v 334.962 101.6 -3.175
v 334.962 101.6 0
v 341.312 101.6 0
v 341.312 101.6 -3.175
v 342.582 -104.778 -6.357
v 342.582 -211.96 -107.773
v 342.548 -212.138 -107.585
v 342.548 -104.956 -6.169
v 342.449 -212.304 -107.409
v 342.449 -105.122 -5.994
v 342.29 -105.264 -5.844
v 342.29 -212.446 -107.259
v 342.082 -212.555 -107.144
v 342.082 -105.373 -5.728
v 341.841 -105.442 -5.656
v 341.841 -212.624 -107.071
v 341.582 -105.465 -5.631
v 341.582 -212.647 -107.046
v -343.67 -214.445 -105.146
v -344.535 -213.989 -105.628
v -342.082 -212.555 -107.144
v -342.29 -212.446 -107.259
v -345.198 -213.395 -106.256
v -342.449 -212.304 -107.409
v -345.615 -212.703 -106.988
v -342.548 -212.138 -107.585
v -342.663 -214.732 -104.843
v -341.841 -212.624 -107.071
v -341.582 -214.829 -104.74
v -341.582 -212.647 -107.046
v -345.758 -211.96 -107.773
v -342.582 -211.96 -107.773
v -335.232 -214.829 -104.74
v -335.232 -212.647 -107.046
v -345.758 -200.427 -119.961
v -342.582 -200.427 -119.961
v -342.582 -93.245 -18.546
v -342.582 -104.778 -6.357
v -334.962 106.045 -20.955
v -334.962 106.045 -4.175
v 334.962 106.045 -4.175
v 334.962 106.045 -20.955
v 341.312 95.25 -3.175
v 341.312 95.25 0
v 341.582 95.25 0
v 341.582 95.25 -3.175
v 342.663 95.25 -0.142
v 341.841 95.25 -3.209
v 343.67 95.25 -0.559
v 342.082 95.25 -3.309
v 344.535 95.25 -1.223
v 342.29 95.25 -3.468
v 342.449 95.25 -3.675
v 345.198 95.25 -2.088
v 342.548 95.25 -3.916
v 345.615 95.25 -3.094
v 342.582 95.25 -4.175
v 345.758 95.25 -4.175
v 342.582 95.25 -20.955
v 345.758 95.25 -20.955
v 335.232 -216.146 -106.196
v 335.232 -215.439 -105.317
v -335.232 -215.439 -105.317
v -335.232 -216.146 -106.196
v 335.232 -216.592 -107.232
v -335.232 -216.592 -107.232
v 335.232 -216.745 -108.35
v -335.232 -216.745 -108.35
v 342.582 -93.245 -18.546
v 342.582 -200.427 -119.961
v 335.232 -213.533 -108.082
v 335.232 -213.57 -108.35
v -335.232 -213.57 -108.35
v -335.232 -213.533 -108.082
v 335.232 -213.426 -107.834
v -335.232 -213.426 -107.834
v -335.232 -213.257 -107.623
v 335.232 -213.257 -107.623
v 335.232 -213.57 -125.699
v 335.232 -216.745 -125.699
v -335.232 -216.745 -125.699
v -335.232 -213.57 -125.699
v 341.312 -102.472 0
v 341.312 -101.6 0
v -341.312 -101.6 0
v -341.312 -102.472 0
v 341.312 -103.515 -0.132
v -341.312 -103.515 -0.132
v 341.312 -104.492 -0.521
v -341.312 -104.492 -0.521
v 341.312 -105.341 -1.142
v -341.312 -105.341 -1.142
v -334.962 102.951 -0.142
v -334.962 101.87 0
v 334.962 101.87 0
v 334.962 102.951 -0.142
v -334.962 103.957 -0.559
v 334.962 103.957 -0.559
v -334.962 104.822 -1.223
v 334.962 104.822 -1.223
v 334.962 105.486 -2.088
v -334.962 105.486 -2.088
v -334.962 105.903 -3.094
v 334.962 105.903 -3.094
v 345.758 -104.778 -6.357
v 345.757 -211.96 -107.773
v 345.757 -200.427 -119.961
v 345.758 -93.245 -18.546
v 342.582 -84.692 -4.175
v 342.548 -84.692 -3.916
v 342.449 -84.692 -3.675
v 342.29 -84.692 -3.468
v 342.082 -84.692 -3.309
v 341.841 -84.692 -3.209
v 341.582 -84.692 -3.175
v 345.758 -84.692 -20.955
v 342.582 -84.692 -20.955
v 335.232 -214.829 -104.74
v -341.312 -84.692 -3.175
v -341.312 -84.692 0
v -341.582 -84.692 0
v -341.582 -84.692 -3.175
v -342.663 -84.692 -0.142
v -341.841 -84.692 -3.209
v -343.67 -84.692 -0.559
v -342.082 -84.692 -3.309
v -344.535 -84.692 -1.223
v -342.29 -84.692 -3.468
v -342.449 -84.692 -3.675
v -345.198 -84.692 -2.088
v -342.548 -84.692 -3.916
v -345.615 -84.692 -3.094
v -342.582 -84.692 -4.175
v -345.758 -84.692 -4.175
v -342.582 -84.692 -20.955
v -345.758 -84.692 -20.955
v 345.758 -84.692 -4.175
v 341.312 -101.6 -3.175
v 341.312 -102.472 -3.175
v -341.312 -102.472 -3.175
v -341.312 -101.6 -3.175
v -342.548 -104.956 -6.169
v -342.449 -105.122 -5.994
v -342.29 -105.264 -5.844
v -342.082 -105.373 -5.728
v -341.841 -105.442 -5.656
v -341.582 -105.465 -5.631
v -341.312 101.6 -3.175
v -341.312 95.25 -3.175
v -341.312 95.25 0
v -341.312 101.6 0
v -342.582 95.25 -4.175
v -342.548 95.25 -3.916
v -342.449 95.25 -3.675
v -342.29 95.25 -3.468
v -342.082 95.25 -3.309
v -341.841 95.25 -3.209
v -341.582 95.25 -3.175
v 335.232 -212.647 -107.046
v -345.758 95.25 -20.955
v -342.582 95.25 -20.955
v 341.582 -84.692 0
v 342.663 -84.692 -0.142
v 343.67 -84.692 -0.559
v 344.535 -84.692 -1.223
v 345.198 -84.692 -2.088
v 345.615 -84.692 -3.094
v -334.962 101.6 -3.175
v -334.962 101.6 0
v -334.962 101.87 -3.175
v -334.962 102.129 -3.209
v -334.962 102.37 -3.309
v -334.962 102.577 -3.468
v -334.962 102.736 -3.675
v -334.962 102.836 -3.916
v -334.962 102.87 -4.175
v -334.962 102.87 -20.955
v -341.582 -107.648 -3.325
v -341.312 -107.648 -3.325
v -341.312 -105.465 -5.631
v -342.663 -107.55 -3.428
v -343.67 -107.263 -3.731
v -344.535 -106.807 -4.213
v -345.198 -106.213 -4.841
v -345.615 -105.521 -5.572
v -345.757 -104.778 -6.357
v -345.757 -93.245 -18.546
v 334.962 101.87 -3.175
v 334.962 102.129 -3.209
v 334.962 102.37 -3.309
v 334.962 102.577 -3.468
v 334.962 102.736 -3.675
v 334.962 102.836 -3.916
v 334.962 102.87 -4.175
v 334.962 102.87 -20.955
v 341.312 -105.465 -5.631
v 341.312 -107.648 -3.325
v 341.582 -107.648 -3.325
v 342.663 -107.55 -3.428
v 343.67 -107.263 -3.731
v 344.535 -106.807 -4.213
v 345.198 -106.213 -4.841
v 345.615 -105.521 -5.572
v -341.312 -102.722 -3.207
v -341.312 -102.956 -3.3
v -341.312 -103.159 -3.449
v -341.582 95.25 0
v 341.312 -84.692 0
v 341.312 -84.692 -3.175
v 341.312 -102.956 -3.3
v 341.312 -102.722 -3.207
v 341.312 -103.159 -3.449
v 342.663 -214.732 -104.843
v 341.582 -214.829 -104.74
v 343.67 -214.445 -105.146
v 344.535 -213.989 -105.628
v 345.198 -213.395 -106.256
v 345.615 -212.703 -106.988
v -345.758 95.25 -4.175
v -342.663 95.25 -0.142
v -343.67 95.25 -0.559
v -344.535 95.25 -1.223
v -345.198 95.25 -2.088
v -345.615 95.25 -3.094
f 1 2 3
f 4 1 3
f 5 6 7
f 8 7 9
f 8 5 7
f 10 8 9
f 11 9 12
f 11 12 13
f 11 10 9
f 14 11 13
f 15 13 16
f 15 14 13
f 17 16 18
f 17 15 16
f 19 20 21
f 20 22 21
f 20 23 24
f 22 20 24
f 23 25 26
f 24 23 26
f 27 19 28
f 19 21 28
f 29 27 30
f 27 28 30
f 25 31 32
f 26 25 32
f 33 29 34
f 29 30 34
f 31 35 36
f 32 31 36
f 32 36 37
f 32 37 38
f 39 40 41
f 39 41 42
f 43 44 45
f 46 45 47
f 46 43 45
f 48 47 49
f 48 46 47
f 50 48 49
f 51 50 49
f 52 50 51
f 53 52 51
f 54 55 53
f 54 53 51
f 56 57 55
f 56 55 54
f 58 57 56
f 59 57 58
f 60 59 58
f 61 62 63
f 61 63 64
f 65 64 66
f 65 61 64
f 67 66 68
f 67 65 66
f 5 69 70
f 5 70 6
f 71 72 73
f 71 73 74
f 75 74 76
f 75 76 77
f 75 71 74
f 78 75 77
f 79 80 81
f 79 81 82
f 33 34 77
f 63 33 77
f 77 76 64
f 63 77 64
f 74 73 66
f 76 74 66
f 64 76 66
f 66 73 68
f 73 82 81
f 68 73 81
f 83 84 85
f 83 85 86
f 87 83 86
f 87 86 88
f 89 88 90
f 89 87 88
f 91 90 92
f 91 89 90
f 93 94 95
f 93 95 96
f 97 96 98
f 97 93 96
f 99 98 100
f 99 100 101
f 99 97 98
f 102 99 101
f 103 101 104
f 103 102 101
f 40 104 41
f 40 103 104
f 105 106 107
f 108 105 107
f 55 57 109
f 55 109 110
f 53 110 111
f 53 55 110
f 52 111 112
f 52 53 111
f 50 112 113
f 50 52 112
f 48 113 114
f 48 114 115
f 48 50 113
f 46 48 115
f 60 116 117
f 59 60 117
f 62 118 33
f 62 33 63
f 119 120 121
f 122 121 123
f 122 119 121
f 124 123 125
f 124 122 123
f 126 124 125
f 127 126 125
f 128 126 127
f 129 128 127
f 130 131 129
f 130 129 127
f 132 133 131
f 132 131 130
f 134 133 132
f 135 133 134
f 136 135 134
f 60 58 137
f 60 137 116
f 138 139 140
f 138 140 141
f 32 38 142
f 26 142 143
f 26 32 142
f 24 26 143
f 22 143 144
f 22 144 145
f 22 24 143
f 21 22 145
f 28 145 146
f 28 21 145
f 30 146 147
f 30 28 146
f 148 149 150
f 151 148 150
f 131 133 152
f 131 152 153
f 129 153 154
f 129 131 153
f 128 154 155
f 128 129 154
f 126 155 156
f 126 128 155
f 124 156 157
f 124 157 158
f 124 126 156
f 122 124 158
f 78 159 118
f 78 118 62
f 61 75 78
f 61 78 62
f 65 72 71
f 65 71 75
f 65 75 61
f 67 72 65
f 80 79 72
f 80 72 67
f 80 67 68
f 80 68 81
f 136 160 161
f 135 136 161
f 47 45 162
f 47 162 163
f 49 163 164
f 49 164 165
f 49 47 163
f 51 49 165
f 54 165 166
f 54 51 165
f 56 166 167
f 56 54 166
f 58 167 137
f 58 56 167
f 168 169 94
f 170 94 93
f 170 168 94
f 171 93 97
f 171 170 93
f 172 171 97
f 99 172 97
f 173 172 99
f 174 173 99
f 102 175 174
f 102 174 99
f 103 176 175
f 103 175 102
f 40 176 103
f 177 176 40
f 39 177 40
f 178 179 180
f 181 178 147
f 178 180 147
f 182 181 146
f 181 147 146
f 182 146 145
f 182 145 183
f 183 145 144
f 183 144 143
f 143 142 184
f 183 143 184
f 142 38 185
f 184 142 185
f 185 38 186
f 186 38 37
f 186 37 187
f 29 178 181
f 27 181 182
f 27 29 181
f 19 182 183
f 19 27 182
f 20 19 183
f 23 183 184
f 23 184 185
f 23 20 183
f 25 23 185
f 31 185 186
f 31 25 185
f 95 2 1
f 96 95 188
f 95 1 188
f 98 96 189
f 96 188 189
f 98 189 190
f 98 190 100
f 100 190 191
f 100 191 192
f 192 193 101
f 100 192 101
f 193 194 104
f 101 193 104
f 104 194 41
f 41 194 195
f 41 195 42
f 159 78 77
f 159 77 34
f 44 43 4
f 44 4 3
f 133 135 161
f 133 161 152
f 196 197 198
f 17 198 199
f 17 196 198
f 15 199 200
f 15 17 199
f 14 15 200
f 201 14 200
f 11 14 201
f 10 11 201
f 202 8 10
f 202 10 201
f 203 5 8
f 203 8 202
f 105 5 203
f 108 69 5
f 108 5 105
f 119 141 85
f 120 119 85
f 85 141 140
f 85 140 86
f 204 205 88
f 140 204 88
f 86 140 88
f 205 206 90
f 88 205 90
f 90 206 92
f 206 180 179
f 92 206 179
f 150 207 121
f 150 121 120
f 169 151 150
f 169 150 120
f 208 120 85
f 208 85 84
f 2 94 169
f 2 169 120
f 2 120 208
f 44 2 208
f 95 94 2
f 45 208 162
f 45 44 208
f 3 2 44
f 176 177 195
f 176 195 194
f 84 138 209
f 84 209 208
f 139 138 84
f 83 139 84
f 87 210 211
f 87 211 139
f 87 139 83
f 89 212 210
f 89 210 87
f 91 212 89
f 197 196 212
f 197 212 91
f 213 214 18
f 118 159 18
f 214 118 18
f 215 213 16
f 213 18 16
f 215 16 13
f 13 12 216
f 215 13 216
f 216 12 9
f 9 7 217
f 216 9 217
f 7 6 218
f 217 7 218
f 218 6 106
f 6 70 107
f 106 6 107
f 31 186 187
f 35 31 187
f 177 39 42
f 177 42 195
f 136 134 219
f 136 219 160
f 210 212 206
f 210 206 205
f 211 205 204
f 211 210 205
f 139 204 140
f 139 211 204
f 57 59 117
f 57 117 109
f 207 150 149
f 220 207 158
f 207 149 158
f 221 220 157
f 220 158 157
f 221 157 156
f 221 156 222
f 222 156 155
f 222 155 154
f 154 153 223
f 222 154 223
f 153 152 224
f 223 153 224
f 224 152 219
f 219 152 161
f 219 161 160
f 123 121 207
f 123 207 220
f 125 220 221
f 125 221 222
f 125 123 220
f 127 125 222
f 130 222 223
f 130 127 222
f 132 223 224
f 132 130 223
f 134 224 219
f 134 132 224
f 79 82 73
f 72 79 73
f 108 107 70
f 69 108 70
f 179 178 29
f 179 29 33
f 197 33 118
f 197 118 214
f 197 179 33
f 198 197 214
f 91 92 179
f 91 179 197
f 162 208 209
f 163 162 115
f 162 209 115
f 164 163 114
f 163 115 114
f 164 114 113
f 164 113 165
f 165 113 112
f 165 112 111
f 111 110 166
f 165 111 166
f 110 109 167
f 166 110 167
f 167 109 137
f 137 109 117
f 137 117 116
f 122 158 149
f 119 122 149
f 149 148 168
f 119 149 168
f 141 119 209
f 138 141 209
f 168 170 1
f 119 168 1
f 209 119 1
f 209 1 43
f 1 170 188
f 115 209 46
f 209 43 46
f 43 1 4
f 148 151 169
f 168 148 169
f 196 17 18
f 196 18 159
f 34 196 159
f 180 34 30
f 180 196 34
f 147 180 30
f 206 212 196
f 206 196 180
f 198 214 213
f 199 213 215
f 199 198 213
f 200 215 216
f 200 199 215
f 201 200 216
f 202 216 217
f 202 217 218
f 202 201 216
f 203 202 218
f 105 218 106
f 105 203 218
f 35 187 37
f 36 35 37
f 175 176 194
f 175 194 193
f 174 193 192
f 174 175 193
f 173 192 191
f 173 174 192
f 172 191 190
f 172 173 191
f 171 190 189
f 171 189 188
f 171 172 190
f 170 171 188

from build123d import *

# Parameters (mm, degrees)
SKETCH1_W                 = 682.625
SKETCH1_H                 = 203.2
BASE_FLANGE1_DEPTH        = 3.175
EDGE_FLANGE1_DEPTH        = 682.625
EDGE_FLANGE3_DEPTH        = 669.925
EDGE_FLANGE3_BEND_DEPTH   = 179.941884035
EDGE_FLANGE3_BEND_2_DEPTH = 179.941884035
EDGE_FLANGE3_BEND_3_DEPTH = 147.556884035
EDGE_FLANGE3_BEND_4_DEPTH = 147.556884035
EDGE_FLANGE4_DEPTH        = 670.465


# Sheet-metal steps are written as plain solids
with BuildPart() as part:
    # Sketch1 → Base-Flange1 (new body)
    with BuildSketch(Plane.XY):
        Rectangle(SKETCH1_W, SKETCH1_H)
    extrude(amount=-BASE_FLANGE1_DEPTH)

    # Edge-Flange1 section (across the edge) → Edge-Flange1 (add)
    with BuildSketch(Plane(origin=(341.3125, -102.87, -3.175), x_dir=(0, 0.6872977622647618, -0.7263757884083493), z_dir=(-1, 0, 0))):
        with BuildLine():
            Line((-3.175, 0.398115965), (-3.175, 151.13))
            Line((-3.175, 151.13), (0, 151.13))
            Line((0, 151.13), (0, 0.398115965))
            ThreePointArc((0, 0.398115965), (0.070920943, 0.02823476), (0.273624212, -0.289181798))
            Line((0.273624212, -0.289181798), (0.872868158, -0.922497251))
            Line((0.872868158, -0.922497251), (-1.43337497, -3.104667646))
            Line((-1.43337497, -3.104667646), (-2.032618917, -2.471352193))
            ThreePointArc((-2.032618917, -2.471352193), (-2.878905063, -1.146138066), (-3.175, 0.398115965))
        make_face()
    extrude(amount=EDGE_FLANGE1_DEPTH)

    # Edge-Flange3 section (across the edge) → Edge-Flange3 (add)
    with BuildSketch(Plane(origin=(-334.9625, 102.87, -3.175), x_dir=(0, -1, 0), z_dir=(1, 0, 0))):
        with BuildLine():
            Line((-3.175, 1), (-3.175, 17.78))
            Line((-3.175, 17.78), (0, 17.78))
            Line((0, 17.78), (0, 1))
            ThreePointArc((0, 1), (0.292893219, 0.292893219), (1, 0))
            Line((1, 0), (1.27, 0))
            Line((1.27, 0), (1.27, -3.175))
            Line((1.27, -3.175), (1, -3.175))
            ThreePointArc((1, -3.175), (-1.952170811, -1.952170811), (-3.175, 1))
        make_face()
    extrude(amount=EDGE_FLANGE3_DEPTH)

    # Edge-Flange3 section 2 (across the edge) → Edge-Flange3 bend (add)
    with BuildSketch(Plane(origin=(-342.5825, -84.691884035, -3.175), x_dir=(1, 0, 0), z_dir=(0, 1, 0))):
        with BuildLine():
            Line((-3.175, 1), (-3.175, 17.78))
            Line((-3.175, 17.78), (0, 17.78))
            Line((0, 17.78), (0, 1))
            ThreePointArc((0, 1), (0.292893219, 0.292893219), (1, 0))
            Line((1, 0), (1.27, 0))
            Line((1.27, 0), (1.27, -3.175))
            Line((1.27, -3.175), (1, -3.175))
            ThreePointArc((1, -3.175), (-1.952170811, -1.952170811), (-3.175, 1))
        make_face()
    extrude(amount=EDGE_FLANGE3_BEND_DEPTH)

    # Edge-Flange3 section 3 (across the edge) → Edge-Flange3 bend 2 (add)
    with BuildSketch(Plane(origin=(342.5825, 95.25, -3.175), x_dir=(-1, 0, 0), z_dir=(0, -1, 0))):
        with BuildLine():
            Line((-3.175, 1), (-3.175, 17.78))
            Line((-3.175, 17.78), (0, 17.78))
            Line((0, 17.78), (0, 1))
            ThreePointArc((0, 1), (0.292893219, 0.292893219), (1, 0))
            Line((1, 0), (1.27, 0))
            Line((1.27, 0), (1.27, -3.175))
            Line((1.27, -3.175), (1, -3.175))
            ThreePointArc((1, -3.175), (-1.952170811, -1.952170811), (-3.175, 1))
        make_face()
    extrude(amount=EDGE_FLANGE3_BEND_2_DEPTH)

    # Edge-Flange3 section 4 (across the edge) → Edge-Flange3 bend 3 (add)
    with BuildSketch(Plane(origin=(-342.5825, -212.647172902, -107.046310811), x_dir=(1, 0, 0), z_dir=(1.4731097295439079e-15, 0.7263757884083494, 0.6872977622647618))):
        with BuildLine():
            Line((-3.175, 1), (-3.175, 17.78))
            Line((-3.175, 17.78), (0, 17.78))
            Line((0, 17.78), (0, 1))
            ThreePointArc((0, 1), (0.292893219, 0.292893219), (1, 0))
            Line((1, 0), (1.27, 0))
            Line((1.27, 0), (1.27, -3.175))
            Line((1.27, -3.175), (1, -3.175))
            ThreePointArc((1, -3.175), (-1.952170811, -1.952170811), (-3.175, 1))
        make_face()
    extrude(amount=EDGE_FLANGE3_BEND_3_DEPTH)

    # Edge-Flange3 section 5 (across the edge) → Edge-Flange3 bend 4 (add)
    with BuildSketch(Plane(origin=(342.5825, -105.465424926, -5.630794607), x_dir=(-1, 0, 0), z_dir=(-1.4731097295439075e-15, -0.7263757884083494, -0.6872977622647617))):
        with BuildLine():
            Line((-3.175, 1), (-3.175, 17.78))
            Line((-3.175, 17.78), (0, 17.78))
            Line((0, 17.78), (0, 1))
            ThreePointArc((0, 1), (0.292893219, 0.292893219), (1, 0))
            Line((1, 0), (1.27, 0))
            Line((1.27, 0), (1.27, -3.175))
            Line((1.27, -3.175), (1, -3.175))
            ThreePointArc((1, -3.175), (-1.952170811, -1.952170811), (-3.175, 1))
        make_face()
    extrude(amount=EDGE_FLANGE3_BEND_4_DEPTH)

    # Edge-Flange4 section (across the edge) → Edge-Flange4 (add)
    with BuildSketch(Plane(origin=(335.2325, -213.569670153, -107.919178969), x_dir=(0, 0.9999999999999994, 3.7524568563540583e-08), z_dir=(-1, 0, 0))):
        with BuildLine():
            Line((-3.175, 0.430496527), (-3.175, 17.78))
            Line((-3.175, 17.78), (0, 17.78))
            Line((0, 17.78), (0, 0.430496527))
            ThreePointArc((0, 0.430496527), (0.081496398, 0.035083916), (0.312702265, -0.295879288))
            Line((0.312702265, -0.295879288), (0.922497284, -0.872868123))
            Line((0.922497284, -0.872868123), (-1.259673025, -3.179111334))
            Line((-1.259673025, -3.179111334), (-1.869468044, -2.602122498))
            ThreePointArc((-1.869468044, -2.602122498), (-2.83475254, -1.220351122), (-3.175, 0.430496527))
        make_face()
    extrude(amount=EDGE_FLANGE4_DEPTH)


solid = part.part
